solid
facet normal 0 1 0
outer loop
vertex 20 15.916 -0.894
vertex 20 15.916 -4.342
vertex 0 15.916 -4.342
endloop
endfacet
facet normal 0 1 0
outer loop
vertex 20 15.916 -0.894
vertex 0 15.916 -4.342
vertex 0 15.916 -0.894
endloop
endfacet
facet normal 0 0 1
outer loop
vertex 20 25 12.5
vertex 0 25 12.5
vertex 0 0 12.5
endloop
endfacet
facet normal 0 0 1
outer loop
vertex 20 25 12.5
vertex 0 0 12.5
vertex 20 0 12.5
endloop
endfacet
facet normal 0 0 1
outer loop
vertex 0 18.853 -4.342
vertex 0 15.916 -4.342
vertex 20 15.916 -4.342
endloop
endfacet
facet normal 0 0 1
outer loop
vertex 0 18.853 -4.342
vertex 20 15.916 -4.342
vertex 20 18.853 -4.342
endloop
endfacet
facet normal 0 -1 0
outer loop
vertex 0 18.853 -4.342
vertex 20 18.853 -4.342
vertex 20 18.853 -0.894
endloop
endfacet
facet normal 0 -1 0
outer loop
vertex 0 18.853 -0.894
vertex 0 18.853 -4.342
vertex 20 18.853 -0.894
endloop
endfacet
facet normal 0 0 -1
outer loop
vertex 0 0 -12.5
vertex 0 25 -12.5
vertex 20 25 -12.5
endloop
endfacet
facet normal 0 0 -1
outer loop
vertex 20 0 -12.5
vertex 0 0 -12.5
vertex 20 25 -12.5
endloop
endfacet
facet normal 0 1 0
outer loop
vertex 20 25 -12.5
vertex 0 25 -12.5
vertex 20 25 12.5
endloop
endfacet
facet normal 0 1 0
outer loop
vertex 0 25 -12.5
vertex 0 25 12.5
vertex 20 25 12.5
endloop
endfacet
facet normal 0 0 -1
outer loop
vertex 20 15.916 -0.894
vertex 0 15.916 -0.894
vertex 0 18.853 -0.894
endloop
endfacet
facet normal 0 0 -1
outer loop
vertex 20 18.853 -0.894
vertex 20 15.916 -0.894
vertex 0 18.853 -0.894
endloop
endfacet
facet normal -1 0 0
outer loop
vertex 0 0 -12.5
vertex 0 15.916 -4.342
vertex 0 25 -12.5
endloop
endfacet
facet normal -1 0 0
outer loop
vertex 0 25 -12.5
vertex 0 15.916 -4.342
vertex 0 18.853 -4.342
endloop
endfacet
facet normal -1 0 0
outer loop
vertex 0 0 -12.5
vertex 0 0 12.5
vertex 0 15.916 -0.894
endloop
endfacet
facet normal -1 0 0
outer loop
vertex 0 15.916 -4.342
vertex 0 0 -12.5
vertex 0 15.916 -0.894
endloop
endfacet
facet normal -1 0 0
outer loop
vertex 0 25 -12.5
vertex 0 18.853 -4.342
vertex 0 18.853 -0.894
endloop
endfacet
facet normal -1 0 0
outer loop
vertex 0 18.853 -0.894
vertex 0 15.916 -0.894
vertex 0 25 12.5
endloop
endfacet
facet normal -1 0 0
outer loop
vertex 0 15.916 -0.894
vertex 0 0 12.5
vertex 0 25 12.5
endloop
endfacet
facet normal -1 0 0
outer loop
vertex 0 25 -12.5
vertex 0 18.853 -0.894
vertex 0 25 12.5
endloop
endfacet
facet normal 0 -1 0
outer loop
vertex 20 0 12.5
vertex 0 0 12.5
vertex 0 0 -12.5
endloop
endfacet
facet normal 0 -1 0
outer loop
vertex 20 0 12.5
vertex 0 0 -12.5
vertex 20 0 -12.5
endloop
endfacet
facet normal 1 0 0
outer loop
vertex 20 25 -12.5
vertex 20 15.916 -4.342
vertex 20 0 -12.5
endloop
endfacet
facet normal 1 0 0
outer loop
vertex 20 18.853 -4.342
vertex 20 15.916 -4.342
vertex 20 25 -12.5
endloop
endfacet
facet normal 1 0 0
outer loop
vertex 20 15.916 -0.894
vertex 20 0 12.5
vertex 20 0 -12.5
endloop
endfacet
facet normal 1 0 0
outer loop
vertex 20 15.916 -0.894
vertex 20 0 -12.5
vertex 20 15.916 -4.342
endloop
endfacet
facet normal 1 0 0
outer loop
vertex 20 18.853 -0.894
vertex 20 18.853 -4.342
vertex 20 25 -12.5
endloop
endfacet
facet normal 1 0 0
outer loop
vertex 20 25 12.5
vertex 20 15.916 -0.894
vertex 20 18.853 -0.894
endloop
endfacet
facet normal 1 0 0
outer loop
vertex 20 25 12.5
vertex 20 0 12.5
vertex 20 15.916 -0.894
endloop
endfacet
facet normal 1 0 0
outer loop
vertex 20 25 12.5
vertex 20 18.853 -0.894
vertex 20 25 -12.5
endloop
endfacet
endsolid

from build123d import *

# Parameters (mm, degrees)
F0_W     = 20
F0_H     = 25
F1_DEPTH = 12.5000001863
F3_W     = 2.9370598495
F3_H     = 3.4478511661
F4_DEPTH = 25


with BuildPart() as f1:
    # F0 (on Top) → F1 (new body, symmetric)
    with BuildSketch(Plane.XY):
        with Locations((10, 12.5)):
            Rectangle(F0_W, F0_H)
    extrude(amount=F1_DEPTH, both=True)

    # F3 (on face) → F4 (cut)
    with BuildSketch(Plane.YZ.offset(20)):
        with Locations((17.3844564706, -2.6178145781)):
            Rectangle(F3_W, F3_H)
    extrude(amount=-F4_DEPTH, mode=Mode.SUBTRACT)


solid = f1.part
